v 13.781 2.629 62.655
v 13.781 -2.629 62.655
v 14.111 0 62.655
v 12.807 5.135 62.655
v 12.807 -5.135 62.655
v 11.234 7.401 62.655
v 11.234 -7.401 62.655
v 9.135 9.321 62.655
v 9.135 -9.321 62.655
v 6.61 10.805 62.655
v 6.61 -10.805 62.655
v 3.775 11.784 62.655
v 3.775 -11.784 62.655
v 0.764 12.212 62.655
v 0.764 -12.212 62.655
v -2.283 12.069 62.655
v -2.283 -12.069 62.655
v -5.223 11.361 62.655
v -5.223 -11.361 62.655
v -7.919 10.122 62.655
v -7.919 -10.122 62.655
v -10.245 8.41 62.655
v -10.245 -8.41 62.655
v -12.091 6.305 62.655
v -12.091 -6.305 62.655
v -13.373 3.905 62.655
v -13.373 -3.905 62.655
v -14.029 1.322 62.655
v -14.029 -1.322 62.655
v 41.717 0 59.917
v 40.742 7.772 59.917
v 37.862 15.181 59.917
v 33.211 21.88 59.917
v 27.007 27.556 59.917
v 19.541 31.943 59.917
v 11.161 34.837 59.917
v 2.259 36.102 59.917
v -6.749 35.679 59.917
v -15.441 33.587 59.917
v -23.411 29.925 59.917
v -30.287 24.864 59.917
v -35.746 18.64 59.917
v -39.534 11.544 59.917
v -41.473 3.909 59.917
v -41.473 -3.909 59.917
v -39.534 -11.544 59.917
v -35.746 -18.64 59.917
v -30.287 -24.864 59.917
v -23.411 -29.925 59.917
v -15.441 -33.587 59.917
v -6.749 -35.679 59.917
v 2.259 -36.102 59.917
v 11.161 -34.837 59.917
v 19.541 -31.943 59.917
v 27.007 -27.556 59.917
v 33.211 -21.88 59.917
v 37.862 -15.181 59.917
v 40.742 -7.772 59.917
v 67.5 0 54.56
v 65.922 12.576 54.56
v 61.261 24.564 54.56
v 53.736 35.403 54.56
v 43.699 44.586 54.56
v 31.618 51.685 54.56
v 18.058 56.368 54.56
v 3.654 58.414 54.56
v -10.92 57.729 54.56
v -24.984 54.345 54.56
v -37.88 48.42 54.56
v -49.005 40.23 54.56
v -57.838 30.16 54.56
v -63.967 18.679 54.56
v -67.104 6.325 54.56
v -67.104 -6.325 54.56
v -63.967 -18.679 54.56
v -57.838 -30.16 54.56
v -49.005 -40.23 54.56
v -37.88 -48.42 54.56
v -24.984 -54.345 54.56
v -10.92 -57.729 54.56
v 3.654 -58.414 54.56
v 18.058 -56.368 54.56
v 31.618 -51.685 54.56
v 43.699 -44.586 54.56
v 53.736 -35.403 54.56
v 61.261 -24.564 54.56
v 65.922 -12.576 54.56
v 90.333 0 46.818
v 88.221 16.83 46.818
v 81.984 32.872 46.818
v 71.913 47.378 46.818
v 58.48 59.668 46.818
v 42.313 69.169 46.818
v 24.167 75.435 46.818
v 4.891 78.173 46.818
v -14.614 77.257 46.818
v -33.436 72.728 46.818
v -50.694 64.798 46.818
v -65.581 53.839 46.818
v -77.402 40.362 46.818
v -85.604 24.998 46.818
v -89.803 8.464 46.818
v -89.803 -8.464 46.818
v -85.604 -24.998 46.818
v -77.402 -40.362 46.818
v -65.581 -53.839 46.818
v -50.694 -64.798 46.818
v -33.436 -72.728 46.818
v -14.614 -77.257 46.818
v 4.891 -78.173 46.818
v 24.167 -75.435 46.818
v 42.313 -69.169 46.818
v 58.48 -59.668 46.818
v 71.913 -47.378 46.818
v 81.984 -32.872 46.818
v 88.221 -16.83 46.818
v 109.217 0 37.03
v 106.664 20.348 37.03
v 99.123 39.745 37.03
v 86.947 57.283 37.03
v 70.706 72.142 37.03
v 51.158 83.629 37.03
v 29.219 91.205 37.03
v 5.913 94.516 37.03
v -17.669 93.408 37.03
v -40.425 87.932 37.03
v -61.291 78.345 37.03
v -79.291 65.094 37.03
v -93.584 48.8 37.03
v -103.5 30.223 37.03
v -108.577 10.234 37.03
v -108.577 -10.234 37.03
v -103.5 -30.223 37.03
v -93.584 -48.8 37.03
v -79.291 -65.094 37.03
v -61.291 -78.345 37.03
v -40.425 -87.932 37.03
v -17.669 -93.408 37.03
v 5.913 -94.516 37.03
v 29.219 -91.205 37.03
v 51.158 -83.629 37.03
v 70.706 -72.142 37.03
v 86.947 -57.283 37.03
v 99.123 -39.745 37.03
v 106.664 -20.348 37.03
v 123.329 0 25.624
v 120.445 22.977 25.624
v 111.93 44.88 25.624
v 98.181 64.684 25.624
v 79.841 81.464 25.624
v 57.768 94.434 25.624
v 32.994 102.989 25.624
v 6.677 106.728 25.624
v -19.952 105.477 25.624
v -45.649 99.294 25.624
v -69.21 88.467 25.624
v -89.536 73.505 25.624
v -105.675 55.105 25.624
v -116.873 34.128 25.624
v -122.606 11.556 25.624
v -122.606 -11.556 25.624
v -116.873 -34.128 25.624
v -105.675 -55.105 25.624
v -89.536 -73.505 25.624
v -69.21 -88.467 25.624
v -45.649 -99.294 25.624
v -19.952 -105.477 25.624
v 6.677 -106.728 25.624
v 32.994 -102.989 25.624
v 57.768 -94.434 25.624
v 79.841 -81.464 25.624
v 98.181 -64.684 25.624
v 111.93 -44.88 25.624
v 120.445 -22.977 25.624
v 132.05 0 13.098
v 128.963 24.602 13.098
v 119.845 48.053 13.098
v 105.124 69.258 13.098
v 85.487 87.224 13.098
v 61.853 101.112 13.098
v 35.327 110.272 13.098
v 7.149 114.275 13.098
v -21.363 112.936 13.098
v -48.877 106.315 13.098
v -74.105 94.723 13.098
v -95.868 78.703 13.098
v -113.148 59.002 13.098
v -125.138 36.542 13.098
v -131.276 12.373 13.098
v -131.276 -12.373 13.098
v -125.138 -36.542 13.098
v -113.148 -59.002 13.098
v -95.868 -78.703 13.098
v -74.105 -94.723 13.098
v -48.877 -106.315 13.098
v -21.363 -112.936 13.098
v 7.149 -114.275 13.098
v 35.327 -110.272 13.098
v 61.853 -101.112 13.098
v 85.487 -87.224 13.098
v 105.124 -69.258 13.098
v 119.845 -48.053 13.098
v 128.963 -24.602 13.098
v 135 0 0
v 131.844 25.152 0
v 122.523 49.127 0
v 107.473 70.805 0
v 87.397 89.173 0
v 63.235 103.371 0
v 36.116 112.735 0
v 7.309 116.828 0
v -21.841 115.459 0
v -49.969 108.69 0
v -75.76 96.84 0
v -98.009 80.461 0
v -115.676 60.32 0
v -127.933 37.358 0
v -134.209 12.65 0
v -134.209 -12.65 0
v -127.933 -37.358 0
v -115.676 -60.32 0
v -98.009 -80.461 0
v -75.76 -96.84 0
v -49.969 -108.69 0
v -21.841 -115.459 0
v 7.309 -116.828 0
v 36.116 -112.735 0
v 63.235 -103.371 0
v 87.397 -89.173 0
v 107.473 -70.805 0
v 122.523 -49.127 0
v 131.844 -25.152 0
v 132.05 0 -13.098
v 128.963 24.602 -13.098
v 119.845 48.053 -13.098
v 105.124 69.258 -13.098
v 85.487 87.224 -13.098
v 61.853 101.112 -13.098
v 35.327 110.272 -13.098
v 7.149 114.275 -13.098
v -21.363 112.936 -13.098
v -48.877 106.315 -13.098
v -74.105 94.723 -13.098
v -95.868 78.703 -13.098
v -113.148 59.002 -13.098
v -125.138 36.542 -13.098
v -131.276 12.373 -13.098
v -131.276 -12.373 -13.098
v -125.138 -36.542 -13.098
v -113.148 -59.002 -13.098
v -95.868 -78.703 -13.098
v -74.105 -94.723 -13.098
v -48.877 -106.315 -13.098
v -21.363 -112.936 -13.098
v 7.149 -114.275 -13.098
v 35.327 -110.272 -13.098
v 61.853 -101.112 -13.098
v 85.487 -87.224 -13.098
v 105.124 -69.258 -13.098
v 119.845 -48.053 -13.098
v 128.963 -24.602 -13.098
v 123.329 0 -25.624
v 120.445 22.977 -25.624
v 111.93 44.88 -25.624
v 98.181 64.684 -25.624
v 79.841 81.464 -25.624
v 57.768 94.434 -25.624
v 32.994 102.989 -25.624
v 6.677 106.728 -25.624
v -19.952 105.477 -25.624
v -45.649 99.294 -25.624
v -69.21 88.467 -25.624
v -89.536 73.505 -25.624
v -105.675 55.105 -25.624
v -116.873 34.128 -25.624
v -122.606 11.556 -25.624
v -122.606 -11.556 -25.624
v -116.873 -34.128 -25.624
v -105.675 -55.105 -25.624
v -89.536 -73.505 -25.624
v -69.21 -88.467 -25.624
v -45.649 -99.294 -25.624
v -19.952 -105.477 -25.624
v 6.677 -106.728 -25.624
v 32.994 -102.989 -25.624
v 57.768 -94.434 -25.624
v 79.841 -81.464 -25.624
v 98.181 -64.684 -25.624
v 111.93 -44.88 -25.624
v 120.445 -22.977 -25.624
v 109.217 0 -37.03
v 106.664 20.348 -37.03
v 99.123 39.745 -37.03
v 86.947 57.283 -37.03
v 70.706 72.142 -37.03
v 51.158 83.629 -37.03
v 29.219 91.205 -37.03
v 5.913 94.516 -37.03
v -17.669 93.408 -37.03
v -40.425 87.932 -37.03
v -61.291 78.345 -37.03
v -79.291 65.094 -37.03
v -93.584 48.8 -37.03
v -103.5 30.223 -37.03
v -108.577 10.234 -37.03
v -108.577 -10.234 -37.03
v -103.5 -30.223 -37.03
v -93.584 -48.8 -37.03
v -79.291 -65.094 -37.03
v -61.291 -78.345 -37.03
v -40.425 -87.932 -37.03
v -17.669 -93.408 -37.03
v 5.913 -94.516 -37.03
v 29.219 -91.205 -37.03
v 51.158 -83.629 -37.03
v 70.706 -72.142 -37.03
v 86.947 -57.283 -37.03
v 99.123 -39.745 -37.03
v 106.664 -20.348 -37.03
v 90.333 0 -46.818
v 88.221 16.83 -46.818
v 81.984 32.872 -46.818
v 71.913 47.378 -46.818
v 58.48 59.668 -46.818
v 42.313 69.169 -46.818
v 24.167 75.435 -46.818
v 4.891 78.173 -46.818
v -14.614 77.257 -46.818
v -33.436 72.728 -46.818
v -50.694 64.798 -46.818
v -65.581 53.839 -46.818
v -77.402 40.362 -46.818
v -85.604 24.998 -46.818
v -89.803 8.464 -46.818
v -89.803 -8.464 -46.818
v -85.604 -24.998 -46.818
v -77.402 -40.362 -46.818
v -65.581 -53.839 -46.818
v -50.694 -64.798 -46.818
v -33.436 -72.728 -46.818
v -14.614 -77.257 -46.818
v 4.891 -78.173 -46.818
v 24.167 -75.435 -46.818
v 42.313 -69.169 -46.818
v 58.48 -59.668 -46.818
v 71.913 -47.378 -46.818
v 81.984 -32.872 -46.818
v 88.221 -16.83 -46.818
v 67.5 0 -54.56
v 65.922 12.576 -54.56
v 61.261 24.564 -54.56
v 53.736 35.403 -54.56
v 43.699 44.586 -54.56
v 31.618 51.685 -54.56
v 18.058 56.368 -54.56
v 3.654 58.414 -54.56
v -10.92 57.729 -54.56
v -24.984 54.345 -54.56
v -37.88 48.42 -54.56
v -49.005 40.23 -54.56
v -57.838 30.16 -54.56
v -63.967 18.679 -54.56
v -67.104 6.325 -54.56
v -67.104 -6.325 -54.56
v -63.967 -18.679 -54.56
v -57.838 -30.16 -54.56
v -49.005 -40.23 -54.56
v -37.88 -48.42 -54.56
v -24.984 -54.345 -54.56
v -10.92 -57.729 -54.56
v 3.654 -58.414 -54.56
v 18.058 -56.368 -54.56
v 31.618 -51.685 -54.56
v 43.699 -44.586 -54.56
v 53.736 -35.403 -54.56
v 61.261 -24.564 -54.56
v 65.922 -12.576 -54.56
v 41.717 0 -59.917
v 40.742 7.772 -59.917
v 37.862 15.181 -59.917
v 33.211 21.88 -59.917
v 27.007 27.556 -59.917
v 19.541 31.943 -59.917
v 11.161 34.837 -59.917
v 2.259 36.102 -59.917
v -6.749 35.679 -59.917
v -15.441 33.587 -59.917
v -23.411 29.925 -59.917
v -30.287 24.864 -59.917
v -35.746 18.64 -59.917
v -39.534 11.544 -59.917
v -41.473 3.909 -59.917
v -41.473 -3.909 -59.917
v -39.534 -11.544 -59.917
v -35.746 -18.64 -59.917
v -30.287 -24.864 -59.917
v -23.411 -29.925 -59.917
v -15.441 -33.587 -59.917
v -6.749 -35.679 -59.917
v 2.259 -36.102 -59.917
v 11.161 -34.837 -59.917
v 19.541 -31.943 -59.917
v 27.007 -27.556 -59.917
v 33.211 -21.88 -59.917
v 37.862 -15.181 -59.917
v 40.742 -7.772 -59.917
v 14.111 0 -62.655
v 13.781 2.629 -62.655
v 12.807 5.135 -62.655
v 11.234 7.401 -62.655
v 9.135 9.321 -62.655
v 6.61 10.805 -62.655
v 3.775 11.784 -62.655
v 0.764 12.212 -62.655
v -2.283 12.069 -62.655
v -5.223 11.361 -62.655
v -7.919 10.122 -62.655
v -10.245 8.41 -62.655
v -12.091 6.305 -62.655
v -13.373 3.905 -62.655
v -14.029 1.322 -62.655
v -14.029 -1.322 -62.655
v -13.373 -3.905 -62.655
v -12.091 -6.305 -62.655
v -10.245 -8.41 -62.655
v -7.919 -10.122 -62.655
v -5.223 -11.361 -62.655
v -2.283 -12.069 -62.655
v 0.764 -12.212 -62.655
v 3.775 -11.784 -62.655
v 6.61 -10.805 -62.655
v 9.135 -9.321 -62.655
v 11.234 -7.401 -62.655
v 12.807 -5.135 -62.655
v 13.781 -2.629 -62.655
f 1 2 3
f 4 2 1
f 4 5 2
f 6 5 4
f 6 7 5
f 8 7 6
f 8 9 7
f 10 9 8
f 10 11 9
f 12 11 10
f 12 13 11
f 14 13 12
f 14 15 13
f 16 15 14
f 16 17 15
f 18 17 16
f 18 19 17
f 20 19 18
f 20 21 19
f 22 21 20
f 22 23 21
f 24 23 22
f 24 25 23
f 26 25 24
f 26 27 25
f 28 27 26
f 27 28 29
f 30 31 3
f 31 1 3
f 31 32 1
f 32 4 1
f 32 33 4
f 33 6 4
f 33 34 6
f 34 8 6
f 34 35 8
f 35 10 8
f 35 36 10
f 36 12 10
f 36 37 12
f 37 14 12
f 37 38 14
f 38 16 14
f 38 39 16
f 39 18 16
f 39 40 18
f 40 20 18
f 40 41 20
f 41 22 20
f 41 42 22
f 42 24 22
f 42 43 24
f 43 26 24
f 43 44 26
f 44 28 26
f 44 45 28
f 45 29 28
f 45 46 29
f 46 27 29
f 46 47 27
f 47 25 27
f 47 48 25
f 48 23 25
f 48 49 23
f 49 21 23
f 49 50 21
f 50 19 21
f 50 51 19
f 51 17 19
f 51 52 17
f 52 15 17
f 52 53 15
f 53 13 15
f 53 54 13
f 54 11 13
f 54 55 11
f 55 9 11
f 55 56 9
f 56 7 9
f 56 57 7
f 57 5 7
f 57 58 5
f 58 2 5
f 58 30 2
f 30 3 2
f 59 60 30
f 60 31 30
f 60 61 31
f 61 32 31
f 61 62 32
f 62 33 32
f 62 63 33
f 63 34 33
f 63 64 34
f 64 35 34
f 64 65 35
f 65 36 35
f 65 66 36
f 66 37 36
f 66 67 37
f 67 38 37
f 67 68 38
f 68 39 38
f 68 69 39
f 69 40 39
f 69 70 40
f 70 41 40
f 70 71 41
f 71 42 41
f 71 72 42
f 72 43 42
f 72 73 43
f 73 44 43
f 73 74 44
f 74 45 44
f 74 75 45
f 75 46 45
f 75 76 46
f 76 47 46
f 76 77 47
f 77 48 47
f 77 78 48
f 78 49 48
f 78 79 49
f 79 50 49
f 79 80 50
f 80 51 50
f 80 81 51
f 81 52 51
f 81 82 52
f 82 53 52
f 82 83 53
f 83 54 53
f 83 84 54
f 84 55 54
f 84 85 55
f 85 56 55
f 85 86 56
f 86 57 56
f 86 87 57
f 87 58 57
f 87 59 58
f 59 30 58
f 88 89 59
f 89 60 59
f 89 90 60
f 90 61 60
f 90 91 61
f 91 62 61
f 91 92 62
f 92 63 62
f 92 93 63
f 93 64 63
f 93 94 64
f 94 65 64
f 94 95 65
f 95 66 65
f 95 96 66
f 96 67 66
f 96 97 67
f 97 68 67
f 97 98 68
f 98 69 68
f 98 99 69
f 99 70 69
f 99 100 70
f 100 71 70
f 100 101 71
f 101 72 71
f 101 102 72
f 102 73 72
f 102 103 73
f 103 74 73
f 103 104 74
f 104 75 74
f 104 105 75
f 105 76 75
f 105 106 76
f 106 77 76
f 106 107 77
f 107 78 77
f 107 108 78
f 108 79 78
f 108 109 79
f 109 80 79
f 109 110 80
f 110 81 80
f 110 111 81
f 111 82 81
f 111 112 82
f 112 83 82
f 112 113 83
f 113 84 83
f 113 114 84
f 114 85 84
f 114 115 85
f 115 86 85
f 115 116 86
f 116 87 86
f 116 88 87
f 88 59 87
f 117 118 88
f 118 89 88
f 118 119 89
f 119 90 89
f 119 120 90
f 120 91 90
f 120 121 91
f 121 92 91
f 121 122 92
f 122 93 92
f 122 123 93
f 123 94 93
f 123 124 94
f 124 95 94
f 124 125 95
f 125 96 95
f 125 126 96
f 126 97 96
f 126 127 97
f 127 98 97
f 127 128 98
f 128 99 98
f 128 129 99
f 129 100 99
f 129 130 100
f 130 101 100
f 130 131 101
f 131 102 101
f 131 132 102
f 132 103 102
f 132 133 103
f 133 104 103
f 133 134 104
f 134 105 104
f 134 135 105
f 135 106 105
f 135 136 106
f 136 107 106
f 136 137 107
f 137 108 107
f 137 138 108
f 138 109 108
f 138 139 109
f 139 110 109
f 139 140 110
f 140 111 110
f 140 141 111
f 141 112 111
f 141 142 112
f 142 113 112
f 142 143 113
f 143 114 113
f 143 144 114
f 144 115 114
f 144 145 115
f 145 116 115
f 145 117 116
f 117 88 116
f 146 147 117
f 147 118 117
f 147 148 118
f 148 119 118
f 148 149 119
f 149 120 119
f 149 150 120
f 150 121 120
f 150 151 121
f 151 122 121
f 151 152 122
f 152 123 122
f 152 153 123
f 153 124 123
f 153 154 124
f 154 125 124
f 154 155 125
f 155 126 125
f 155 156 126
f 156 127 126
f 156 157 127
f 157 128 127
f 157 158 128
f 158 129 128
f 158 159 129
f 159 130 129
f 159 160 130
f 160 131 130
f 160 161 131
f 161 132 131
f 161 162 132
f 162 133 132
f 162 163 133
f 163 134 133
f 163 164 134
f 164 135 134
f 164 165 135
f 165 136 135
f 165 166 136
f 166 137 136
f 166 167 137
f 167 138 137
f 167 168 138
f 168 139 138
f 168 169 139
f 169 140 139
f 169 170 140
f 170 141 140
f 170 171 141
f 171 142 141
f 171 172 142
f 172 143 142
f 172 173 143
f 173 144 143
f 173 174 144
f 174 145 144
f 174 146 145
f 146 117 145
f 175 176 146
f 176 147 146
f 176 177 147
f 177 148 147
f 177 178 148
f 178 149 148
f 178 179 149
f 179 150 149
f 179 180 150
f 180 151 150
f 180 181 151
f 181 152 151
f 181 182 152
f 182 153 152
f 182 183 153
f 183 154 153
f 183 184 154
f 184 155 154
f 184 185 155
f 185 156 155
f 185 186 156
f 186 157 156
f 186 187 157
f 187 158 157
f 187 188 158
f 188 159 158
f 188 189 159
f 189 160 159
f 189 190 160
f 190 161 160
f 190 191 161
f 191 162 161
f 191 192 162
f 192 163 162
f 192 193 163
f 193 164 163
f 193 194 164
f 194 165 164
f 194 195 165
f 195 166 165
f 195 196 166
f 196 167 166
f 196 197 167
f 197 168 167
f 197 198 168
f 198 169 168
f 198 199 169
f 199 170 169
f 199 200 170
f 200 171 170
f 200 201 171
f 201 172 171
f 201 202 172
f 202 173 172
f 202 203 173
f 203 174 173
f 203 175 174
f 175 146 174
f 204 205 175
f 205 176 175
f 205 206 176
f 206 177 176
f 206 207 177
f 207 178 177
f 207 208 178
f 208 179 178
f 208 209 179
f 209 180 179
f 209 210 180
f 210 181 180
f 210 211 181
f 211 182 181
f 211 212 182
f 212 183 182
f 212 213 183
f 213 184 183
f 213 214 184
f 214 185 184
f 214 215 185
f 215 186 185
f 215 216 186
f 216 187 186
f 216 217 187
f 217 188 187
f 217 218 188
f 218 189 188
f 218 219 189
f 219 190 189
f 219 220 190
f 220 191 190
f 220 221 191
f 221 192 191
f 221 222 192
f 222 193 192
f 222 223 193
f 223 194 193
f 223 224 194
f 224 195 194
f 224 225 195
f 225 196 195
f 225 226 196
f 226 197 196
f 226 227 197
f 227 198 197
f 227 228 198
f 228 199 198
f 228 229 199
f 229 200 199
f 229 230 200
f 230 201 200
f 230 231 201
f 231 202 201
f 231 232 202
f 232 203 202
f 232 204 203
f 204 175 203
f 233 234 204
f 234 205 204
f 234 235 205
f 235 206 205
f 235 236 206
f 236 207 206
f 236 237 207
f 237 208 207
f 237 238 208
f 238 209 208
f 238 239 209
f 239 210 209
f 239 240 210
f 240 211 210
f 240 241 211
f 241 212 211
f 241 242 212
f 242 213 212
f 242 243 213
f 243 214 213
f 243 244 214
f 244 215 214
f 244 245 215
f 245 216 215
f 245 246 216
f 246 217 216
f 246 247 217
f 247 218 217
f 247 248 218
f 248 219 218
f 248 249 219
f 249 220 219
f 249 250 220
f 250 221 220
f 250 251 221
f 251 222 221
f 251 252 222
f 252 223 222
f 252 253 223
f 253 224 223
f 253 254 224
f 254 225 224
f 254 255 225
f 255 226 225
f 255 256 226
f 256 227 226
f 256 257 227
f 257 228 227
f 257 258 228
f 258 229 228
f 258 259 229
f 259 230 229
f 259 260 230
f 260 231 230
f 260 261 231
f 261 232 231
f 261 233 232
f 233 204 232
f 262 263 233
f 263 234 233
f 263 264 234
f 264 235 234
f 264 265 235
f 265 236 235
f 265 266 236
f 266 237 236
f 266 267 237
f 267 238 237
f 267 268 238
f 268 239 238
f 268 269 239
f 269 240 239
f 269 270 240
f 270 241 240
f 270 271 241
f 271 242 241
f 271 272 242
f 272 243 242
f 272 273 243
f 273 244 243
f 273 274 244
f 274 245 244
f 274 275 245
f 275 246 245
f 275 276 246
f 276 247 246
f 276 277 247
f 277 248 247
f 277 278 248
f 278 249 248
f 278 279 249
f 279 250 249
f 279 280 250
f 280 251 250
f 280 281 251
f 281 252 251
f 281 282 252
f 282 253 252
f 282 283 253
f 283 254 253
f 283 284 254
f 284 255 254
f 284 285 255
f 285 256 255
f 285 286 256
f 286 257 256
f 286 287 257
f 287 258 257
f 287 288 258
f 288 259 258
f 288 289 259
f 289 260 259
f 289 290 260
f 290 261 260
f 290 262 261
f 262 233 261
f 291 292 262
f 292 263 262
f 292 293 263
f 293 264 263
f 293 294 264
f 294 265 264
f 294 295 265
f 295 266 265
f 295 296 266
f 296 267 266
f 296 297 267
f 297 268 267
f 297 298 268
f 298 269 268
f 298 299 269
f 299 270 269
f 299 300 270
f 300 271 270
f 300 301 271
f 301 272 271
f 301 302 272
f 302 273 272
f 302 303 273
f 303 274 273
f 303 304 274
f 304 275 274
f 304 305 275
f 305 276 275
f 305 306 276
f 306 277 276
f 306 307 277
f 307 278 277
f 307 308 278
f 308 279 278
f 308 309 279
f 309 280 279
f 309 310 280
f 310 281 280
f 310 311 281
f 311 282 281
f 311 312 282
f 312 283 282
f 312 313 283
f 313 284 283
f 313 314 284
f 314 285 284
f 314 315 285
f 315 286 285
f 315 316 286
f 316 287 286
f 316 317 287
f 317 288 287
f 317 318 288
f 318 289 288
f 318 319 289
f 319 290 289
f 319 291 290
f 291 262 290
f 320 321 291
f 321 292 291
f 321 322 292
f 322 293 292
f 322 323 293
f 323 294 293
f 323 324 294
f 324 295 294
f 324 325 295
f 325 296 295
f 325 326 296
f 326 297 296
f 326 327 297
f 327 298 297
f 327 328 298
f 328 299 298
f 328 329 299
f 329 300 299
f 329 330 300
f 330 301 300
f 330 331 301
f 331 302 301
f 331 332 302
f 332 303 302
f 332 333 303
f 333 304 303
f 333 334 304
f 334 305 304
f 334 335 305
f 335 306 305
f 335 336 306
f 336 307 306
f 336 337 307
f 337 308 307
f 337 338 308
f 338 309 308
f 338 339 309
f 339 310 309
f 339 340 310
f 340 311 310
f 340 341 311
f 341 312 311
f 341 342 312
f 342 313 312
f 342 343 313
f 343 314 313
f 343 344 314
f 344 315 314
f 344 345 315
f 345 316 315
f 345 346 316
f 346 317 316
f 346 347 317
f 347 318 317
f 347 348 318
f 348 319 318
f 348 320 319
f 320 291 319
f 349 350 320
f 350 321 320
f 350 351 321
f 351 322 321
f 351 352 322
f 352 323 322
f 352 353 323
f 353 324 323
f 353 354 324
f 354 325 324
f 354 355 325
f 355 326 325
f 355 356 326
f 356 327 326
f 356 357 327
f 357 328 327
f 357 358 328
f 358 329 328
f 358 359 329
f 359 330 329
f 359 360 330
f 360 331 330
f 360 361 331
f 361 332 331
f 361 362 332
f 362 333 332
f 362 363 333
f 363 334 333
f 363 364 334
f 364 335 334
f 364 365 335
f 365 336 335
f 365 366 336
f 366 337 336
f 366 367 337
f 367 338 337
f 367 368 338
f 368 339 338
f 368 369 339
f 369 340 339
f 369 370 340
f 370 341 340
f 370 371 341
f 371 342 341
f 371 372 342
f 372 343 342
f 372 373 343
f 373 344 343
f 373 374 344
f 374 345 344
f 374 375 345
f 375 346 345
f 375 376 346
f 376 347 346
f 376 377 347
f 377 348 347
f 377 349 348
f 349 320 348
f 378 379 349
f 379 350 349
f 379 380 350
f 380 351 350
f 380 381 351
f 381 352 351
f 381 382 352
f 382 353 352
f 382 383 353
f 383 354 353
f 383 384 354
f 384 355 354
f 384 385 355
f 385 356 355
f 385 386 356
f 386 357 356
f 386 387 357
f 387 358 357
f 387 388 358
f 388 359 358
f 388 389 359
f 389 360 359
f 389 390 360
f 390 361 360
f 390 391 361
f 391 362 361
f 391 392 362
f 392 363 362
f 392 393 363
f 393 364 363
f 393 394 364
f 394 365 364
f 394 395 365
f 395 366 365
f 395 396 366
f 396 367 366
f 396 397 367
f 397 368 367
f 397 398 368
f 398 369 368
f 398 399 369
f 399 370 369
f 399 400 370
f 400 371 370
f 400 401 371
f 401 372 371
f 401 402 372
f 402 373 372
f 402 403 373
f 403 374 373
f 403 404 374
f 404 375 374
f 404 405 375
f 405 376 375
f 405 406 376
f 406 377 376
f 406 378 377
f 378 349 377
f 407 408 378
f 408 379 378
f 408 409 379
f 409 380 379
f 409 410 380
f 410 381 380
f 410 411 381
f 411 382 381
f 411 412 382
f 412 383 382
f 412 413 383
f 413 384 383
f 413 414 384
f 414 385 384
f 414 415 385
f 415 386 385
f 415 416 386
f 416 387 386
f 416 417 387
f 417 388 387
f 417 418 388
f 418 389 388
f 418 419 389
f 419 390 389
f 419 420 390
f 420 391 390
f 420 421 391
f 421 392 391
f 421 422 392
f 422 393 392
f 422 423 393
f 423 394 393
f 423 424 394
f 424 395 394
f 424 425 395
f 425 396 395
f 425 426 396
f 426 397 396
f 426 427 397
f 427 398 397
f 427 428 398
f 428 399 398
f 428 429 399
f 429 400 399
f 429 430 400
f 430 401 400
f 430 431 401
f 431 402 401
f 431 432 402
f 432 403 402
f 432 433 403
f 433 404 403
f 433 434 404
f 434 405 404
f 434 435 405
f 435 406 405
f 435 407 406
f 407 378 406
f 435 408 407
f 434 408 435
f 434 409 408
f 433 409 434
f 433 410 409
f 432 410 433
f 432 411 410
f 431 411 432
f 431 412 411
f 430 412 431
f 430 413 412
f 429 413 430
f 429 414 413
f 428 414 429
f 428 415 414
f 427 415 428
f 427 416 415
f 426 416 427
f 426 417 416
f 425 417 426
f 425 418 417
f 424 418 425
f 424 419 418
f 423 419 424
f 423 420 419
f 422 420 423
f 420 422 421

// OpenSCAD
// Generated by SolidPython 1.0.1 on 2020-07-29 00:46:52


scale(v = [15, 13, 7]) {
	sphere(r = 9);
}
/***********************************************
*********      SolidPython code:      **********
************************************************
 
# import packages: SolidPython
from solid import *
from solid.utils import *
from itertools import chain, combinations, permutations


class Resize:

    def __init__(self, scad_file):
        self.scad_file = scad_file
        #self.scad_file = import_scad(scad_file)
        # cone/cylinder param:
        self.r1 = 0
        self.r2 = 0
        self.h = 0
        # rectangular prism param:
        self.w = 0
        self.l = 0
        # ellipse param:
        self.r = 0

    # import OpenScad code (file name corresponds to shape)


    # classify shape + parameters
    def assign(self, param1, param2, param3):
        if self.scad_file == 'cone.scad':
            self.r1 = param1
            self.r2 = param2
            self.h = param3
        elif self.scad_file == 'cylinder.scad':
            self.r1 = param1
            self.r2 = param2
            self.h = param3
        elif self.scad_file == 'rectangularPrism.scad':
            self.h = param1
            self.l = param2
            self.w = param3
        else:
            self.r = param1
            self.h = param2

    # resize parameters
    def iterate(self):
        x = range(3, 20, 2)
        i = 1
        if self.scad_file == 'cone.scad':
            tempList = list(permutations(x, 2))
            for temp in tempList:
                param1 = temp[0]
                param2 = temp[1]
                filepath = 'produced_scad_files/' + 'cone' + str(param1) + '_' + str(param2) + '_' + '.scad'
                scad_render_to_file(cylinder(h=param1, r1=param2, r2=0), filepath)

        elif self.scad_file == 'cylinder.scad':
            tempList = list(permutations(x, 3))
            for temp in tempList:
                param1 = temp[0]
                param2 = temp[1]
                filepath = 'produced_scad_files/' + 'cylinder' + str(param1) + '_' + str(param2) + '_' + '.scad'
                scad_render_to_file(cylinder(h=param1, r1=param2, r2=param2), filepath)

        elif self.scad_file == 'rectangularPrism.scad':
            tempList = list(permutations(x, 3))
            for temp in tempList:
                param1 = temp[0]
                param2 = temp[1]
                param3 = temp[2]
                filepath = 'produced_scad_files/' + 'rectangularPrism' + str(param1) + '_' + str(param2) + '_' + str(
                    param3) + '.scad'
                scad_render_to_file(cube(size=(param1, param2, param3)), filepath)

        elif self.scad_file == 'ellipse.scad':
            tempList = list(permutations(x, 4))
            for temp in tempList:
                param1 = temp[0]
                param2 = temp[1]
                param3 = temp[2]
                param4 = temp[3]
                filepath = 'produced_scad_files/' + 'ellipse' + str(param1) + '_' + str(param2) + '_' + str(param3) + '_' + str(param4) + '.scad'
                scad_render_to_file(scale([param1, param2, param3])(sphere(r=param4)), filepath)

    def render_to_scadfile(self):
        scad_render_to_file(scad, 'example.scad') 
 
************************************************/
